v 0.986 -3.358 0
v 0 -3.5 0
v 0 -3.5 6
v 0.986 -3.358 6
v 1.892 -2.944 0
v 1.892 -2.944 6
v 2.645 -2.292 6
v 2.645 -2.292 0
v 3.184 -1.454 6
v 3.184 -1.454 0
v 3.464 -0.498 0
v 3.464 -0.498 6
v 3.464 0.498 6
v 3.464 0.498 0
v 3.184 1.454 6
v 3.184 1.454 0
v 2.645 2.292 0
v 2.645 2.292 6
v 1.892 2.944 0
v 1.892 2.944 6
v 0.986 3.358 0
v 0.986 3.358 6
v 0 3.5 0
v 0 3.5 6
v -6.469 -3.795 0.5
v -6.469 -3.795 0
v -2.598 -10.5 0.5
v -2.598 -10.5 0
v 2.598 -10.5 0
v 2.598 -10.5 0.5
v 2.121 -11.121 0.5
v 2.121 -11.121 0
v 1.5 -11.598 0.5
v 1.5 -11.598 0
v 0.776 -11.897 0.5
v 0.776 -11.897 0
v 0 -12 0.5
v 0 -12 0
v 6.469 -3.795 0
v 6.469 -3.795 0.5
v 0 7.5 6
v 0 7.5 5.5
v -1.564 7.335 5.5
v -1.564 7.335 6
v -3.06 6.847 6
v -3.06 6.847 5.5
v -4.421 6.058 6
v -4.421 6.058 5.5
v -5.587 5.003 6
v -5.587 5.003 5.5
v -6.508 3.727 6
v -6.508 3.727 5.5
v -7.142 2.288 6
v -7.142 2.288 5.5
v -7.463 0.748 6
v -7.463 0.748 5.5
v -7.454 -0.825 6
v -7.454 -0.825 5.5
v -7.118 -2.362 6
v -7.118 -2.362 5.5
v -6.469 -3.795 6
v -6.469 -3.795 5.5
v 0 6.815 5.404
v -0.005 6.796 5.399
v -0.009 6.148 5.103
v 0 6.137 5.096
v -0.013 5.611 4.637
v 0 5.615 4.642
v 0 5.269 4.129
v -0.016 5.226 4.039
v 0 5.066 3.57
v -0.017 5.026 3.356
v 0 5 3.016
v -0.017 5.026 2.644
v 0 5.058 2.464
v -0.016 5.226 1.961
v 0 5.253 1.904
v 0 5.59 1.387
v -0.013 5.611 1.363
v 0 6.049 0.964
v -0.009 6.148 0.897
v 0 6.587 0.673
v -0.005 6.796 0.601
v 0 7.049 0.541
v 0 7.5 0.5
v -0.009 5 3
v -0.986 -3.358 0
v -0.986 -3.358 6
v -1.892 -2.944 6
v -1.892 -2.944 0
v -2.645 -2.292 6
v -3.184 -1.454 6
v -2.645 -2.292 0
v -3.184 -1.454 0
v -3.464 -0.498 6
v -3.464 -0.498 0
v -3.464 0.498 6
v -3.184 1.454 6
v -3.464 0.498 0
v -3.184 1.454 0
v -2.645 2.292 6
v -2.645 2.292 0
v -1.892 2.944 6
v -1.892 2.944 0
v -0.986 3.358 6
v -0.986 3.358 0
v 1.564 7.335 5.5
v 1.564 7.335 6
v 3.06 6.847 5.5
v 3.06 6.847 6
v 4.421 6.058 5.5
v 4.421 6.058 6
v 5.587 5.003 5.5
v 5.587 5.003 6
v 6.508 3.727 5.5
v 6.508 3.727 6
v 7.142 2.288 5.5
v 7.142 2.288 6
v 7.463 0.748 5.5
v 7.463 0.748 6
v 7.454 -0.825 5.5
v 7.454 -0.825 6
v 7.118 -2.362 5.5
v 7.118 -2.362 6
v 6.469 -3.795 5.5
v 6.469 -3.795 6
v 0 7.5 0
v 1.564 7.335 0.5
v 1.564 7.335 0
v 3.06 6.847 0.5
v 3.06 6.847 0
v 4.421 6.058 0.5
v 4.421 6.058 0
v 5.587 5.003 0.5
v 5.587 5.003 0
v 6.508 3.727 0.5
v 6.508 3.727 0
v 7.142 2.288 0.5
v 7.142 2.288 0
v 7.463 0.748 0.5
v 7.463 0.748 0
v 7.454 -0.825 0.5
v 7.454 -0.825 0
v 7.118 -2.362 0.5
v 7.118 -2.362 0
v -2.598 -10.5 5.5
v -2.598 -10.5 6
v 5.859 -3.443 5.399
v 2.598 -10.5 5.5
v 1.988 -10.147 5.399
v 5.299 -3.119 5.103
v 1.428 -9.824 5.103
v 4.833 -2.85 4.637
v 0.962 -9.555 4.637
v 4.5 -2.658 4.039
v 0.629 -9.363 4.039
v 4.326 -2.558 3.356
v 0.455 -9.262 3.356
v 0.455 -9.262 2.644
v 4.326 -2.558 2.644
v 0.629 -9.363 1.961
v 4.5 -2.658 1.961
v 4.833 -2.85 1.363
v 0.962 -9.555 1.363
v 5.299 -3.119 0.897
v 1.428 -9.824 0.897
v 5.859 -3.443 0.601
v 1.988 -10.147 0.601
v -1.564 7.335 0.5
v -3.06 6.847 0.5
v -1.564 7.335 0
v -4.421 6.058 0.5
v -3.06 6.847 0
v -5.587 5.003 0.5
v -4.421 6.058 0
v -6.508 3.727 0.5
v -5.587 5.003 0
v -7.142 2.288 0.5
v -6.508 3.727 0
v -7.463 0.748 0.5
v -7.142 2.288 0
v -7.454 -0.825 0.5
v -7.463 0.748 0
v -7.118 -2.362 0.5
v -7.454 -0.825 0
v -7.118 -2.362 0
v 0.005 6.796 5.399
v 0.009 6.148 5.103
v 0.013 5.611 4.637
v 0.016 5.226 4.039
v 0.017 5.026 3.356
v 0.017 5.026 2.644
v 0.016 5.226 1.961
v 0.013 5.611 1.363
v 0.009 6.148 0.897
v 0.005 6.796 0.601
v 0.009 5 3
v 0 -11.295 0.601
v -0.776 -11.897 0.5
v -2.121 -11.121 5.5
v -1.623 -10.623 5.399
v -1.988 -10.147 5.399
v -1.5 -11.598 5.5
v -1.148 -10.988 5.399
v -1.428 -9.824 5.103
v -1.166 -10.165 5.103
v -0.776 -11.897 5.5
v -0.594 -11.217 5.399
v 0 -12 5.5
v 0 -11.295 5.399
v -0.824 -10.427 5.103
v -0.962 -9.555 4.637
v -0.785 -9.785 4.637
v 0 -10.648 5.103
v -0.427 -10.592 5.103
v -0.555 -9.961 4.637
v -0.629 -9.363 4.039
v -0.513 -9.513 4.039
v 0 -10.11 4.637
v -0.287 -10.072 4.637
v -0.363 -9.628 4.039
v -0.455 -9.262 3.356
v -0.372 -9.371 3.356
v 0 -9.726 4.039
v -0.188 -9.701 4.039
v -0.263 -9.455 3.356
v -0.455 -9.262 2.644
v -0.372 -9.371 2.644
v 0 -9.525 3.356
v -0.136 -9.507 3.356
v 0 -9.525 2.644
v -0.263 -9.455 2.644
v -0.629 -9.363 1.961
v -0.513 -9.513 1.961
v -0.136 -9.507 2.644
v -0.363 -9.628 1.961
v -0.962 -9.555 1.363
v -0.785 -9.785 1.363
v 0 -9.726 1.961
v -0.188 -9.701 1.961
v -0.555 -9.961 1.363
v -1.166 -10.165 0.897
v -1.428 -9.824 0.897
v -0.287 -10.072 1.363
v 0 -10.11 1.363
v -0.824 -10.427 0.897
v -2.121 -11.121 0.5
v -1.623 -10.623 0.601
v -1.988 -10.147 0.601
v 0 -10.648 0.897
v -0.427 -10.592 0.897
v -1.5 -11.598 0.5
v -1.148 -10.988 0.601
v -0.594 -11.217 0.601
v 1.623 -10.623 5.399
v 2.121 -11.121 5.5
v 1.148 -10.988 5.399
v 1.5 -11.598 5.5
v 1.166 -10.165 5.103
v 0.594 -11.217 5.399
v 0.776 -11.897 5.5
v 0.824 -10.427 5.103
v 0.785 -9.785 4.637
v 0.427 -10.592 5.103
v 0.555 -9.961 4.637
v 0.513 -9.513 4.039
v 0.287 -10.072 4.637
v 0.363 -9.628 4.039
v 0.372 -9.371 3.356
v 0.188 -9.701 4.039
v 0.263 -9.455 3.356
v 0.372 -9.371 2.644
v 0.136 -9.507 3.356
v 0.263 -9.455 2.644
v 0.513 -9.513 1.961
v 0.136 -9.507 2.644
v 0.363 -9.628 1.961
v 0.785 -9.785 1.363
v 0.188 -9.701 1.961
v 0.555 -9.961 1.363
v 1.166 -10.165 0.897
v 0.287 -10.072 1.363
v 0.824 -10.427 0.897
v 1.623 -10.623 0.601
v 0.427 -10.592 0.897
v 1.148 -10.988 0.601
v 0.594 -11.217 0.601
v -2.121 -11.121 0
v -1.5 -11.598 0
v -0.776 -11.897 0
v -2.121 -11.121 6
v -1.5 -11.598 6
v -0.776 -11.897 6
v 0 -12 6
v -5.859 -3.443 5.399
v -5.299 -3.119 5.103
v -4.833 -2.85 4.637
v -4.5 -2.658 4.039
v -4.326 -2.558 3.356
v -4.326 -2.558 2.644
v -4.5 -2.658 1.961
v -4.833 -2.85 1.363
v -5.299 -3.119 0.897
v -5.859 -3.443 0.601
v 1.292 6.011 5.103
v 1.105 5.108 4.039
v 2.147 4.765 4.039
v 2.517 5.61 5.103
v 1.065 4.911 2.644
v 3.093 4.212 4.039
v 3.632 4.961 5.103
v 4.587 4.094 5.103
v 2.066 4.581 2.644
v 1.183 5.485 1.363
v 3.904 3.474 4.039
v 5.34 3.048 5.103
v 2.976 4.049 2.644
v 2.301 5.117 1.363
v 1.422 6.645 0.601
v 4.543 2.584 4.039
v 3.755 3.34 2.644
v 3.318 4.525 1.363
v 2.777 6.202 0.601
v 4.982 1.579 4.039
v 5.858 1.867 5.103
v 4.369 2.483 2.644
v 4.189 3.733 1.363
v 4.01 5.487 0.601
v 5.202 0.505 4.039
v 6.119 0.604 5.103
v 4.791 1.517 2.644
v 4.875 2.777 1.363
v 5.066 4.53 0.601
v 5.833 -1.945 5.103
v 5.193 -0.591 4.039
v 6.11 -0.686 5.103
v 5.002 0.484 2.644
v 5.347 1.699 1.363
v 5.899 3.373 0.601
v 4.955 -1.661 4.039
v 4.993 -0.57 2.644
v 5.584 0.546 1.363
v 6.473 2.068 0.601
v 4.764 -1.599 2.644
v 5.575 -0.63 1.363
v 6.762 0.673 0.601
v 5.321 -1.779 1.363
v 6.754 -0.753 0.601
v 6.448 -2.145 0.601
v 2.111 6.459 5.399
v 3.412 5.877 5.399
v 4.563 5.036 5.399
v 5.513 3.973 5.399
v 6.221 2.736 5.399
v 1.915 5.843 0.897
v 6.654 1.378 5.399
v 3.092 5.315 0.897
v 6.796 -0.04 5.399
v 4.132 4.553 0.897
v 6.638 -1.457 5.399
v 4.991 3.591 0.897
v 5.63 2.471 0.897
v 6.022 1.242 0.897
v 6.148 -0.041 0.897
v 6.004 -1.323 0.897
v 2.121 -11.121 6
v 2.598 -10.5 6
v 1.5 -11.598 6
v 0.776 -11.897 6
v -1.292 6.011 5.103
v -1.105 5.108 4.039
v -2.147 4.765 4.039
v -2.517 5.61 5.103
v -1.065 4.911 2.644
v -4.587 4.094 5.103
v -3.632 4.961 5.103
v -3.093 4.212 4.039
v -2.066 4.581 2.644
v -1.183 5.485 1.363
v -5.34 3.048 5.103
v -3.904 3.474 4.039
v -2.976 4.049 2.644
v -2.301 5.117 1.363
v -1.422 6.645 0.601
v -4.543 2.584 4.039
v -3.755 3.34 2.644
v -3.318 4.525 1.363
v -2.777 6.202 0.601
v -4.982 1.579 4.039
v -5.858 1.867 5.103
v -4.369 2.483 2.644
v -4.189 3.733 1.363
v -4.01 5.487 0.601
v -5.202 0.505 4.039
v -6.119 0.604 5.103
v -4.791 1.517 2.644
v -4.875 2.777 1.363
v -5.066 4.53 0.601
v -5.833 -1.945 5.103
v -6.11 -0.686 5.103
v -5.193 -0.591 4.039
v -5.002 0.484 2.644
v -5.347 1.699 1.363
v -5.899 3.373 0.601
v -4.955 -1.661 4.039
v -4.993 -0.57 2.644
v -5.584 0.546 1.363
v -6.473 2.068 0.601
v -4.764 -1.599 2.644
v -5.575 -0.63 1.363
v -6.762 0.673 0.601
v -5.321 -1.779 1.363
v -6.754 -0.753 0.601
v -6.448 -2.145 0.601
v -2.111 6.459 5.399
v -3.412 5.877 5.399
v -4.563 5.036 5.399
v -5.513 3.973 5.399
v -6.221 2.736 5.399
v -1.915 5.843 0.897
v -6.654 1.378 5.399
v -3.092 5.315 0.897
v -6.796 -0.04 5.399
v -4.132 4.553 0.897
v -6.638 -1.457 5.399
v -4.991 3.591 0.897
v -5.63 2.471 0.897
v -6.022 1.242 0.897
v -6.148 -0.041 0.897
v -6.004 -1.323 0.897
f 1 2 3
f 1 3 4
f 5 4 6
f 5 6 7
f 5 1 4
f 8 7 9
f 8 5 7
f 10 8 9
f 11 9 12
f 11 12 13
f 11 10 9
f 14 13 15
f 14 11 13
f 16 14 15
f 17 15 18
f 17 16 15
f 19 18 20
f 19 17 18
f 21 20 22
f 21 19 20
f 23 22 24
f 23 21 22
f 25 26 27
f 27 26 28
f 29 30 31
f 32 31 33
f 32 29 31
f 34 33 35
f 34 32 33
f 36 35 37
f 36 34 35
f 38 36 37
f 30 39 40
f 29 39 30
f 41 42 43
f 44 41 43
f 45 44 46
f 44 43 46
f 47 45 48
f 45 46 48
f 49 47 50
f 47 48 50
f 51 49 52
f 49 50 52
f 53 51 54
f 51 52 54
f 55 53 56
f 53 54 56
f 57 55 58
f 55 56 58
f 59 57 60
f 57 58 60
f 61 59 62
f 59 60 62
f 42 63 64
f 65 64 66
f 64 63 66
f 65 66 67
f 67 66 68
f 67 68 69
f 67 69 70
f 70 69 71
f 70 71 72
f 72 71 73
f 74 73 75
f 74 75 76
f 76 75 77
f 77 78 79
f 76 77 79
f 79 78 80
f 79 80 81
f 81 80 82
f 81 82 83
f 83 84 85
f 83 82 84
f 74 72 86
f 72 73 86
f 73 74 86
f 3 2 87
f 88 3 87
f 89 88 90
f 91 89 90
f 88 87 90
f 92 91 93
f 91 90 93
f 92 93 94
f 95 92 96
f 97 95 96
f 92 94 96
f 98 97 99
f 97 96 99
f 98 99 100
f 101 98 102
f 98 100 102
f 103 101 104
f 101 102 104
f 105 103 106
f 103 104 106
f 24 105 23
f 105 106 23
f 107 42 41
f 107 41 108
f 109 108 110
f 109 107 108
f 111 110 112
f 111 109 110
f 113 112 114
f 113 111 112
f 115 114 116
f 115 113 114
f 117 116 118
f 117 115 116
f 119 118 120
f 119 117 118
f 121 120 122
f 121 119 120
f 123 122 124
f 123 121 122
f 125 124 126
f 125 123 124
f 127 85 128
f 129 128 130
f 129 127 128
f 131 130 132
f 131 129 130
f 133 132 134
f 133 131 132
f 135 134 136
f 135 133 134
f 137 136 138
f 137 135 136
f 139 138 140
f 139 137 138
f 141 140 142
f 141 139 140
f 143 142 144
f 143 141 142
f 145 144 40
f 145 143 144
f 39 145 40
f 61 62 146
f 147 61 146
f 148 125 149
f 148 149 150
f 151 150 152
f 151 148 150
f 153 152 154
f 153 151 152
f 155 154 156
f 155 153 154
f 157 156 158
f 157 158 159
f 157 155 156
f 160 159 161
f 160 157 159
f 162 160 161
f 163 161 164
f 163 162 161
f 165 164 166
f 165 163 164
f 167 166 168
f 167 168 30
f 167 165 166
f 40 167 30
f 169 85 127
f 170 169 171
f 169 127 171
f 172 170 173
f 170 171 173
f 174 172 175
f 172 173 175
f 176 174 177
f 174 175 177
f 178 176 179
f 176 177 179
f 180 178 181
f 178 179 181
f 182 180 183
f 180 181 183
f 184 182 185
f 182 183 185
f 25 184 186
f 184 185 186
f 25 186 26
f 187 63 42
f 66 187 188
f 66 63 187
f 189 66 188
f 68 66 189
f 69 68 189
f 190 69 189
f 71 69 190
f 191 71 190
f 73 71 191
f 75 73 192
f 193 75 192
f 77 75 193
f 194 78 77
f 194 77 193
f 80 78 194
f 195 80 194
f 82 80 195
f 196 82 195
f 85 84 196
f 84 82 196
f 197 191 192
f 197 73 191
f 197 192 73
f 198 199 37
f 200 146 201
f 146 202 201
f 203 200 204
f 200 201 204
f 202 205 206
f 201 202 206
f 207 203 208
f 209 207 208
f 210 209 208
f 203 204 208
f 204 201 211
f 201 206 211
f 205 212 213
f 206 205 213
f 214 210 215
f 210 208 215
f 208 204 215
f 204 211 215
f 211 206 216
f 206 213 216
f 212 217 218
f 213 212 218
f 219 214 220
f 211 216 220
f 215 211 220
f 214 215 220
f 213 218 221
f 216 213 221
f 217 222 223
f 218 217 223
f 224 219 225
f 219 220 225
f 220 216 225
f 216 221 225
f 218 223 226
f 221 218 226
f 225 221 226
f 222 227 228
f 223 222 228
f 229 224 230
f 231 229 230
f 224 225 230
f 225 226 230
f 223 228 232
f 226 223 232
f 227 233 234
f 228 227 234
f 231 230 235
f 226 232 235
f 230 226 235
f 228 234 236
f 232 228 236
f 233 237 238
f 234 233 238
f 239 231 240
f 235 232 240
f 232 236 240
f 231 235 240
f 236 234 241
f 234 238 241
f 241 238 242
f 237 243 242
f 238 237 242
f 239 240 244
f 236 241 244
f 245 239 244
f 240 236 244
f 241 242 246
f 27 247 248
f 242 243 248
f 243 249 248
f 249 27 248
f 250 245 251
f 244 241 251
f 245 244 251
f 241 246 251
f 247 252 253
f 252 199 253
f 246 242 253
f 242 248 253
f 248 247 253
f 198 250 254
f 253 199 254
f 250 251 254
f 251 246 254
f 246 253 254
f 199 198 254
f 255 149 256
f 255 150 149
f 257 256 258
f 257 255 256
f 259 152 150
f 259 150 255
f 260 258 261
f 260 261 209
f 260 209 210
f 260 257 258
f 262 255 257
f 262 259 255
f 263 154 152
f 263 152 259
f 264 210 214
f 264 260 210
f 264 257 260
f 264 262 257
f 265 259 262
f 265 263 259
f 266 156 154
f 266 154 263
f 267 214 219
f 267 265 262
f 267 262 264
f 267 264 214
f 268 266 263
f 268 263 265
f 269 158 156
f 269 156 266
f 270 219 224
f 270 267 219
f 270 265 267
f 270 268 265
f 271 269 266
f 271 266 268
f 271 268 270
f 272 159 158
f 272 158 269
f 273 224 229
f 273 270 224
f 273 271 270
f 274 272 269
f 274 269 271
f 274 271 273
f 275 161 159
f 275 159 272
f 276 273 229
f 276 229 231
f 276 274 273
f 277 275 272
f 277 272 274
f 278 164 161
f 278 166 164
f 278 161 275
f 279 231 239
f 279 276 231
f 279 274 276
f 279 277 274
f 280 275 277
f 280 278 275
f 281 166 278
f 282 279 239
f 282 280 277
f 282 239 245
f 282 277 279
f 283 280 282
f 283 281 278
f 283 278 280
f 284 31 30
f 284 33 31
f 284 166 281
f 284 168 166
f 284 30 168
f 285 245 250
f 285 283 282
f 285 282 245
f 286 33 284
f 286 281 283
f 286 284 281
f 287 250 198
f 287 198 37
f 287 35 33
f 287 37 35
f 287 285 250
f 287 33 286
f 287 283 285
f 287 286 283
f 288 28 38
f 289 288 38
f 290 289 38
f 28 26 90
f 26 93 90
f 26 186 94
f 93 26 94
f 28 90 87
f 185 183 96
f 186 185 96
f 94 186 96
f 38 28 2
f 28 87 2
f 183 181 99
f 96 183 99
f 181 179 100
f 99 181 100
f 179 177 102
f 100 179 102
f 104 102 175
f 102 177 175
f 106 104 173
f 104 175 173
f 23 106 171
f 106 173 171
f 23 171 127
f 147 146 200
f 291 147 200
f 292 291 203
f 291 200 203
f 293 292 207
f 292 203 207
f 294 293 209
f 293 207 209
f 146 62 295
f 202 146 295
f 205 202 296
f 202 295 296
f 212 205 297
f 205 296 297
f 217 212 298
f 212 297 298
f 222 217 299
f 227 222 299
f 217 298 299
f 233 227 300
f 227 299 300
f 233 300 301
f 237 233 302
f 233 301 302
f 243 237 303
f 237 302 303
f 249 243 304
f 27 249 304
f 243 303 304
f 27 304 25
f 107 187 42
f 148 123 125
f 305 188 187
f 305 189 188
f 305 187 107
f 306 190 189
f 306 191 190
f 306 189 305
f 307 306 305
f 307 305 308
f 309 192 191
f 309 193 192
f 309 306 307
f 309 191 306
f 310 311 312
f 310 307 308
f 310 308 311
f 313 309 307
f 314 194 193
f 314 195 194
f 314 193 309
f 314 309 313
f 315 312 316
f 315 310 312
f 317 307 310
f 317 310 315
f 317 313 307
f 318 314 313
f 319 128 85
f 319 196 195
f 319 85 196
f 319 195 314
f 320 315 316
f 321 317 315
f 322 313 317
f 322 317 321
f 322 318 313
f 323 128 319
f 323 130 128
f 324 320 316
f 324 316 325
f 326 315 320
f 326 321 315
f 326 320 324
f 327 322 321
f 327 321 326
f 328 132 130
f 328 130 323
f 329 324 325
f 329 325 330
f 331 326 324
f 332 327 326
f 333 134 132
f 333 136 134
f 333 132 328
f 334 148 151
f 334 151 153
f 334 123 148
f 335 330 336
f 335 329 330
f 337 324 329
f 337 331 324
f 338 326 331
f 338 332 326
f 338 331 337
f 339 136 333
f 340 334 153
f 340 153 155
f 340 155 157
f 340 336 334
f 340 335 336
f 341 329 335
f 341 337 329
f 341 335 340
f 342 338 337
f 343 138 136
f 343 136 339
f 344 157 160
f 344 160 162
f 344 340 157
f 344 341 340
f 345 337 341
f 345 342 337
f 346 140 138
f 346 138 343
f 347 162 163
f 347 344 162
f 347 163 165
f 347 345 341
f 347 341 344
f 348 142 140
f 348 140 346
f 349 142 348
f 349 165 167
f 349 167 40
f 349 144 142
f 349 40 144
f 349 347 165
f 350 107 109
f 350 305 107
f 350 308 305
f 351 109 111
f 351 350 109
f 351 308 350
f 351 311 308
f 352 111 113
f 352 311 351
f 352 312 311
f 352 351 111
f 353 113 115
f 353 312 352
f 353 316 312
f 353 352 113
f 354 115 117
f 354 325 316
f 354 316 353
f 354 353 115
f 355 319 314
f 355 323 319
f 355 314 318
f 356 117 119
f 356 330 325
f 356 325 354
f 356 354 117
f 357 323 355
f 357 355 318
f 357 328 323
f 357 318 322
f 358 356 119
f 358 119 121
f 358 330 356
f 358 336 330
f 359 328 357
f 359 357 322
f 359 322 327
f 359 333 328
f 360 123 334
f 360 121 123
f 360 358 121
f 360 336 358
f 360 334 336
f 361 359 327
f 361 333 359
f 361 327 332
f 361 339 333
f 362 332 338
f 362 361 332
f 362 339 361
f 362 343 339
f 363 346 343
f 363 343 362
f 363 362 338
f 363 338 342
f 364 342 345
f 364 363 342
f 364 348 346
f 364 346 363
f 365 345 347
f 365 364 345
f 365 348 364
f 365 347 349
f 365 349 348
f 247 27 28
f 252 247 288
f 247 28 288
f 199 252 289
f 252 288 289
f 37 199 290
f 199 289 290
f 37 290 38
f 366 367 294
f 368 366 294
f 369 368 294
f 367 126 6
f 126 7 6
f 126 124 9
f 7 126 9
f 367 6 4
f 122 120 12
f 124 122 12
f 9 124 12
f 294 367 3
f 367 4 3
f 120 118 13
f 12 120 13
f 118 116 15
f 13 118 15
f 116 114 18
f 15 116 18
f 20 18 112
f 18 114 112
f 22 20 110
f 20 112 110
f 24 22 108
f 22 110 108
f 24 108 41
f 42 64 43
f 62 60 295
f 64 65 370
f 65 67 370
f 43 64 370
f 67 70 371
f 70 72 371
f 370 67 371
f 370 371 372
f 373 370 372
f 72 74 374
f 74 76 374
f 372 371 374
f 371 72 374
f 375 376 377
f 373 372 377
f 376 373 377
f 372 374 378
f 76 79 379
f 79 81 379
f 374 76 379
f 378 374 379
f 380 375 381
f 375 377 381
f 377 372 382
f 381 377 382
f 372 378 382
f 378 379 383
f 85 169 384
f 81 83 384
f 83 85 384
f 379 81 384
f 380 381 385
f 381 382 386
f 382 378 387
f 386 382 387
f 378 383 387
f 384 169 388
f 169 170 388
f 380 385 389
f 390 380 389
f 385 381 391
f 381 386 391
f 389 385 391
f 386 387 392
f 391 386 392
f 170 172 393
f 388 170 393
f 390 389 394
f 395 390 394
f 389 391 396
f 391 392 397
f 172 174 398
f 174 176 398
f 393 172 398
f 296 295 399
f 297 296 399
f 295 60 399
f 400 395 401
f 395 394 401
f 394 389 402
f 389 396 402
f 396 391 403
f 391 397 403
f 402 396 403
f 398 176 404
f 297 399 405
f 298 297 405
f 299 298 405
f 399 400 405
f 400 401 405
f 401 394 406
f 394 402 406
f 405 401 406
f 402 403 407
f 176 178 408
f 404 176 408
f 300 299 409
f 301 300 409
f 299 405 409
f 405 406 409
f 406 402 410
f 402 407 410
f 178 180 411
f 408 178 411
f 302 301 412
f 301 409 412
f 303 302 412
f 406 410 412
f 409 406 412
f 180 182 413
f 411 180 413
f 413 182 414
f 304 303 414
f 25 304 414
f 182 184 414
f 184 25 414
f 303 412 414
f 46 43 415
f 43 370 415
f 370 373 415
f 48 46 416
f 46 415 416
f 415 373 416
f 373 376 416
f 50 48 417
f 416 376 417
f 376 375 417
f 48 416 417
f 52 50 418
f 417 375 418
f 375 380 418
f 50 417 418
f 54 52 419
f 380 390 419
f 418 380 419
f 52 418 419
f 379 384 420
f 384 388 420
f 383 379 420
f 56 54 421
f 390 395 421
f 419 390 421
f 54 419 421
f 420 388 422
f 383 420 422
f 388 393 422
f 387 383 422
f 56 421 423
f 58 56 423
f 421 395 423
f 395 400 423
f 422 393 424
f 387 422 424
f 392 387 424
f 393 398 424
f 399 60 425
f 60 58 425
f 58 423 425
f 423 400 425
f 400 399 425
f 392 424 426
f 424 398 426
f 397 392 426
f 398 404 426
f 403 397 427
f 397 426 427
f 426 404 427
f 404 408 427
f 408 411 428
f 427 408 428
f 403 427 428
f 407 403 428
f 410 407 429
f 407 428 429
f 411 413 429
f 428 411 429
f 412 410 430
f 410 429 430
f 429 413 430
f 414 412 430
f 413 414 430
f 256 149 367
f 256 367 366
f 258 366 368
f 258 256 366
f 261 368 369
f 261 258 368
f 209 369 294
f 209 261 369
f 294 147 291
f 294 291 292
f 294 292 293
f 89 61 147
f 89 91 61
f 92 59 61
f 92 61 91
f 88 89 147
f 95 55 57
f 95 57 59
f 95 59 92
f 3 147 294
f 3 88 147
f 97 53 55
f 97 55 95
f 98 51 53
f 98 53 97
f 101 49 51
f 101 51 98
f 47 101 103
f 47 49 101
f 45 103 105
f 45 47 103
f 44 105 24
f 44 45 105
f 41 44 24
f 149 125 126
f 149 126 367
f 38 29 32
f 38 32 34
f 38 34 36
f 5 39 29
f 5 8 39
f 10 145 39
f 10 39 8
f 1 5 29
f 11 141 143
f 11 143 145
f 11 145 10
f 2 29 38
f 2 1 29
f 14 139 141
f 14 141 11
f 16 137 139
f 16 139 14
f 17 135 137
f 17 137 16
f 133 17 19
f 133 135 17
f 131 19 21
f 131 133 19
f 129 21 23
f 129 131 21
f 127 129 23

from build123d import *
from build123d import SkipClean  # not in build123d's __all__

# Parameters (mm, degrees)
F1_DEPTH = 6
F9_DEPTH = 25


with BuildPart() as f1:
    # F0 (on Top) → F1 (new body)
    with BuildSketch(Plane.XY):
        with BuildLine():
            Line((0, 3.5), (0, 7.5))
            ThreePointArc((0, 7.5), (-6.5081460588, 3.7274703054), (-6.4690456472, -3.7949240327))
            Line((-6.4690456472, -3.7949240327), (-2.5980762114, -10.4996397702))
            ThreePointArc((-2.5980762114, -10.4996397702), (-1.5, -11.5977159815), (0, -11.9996397702))
            Line((0, -11.9996397702), (0, -3.5))
            ThreePointArc((0, -3.5), (-3.5, 0), (0, 3.5))
        make_face()
    extrude(amount=F1_DEPTH)

    # F4: sweep along a path in F4_path
    with BuildLine(Plane(origin=(-2.5980762114, -10.4996397702, 0), x_dir=(0.5, -0.8660254038, 0), z_dir=(0.8660254038, 0.5, 0))) as f4_path:
        Line((0, 0), (-7.7419388717, 0))
    # F3 (on face) → F4 (sweep, cut)
    with BuildSketch(Plane(origin=(3.8969583329, -6.7497298276, 0), x_dir=(0.8660254038, 0.5, 0), z_dir=(0.5, -0.8660254038, 0))):
        with BuildLine():
            ThreePointArc((-7.4998198851, 0.5), (-4.9998198851, 3), (-7.4998198851, 5.5))
            Line((-7.4998198851, 5.5), (-7.4998198851, 0.5))
        make_face()
    sweep(path=f4_path.line, mode=Mode.SUBTRACT)

    # F7: sweep along a path in F0
    with BuildLine(Plane.XY) as f7_path:
        ThreePointArc((0, 7.5), (-6.5081460588, 3.7274703054), (-6.4690456472, -3.7949240327))
    # F6 (on face) → F7 (sweep, cut)
    with BuildSketch(Plane(origin=(0.0259888971, -0.0450140902, 0), x_dir=(-0.8660254038, -0.5, 0), z_dir=(-0.5, 0.8660254038, 0))):
        with BuildLine():
            ThreePointArc((7.4998198851, 5.5), (4.9998198851, 3), (7.4998198851, 0.5))
            Line((7.4998198851, 0.5), (7.4998198851, 5.5))
        make_face()
    sweep(path=f7_path.line, mode=Mode.SUBTRACT)

    # F8 (on face) → F9 (cut)
    with BuildSketch(Plane.YZ):
        with BuildLine():
            Line((7.5, 0.5), (7.5, 5.5))
            add(Edge.make_bspline(
                [(7.5, 5.5), (5.0000600383, 5.5), (5.0000600383, 3), (5.0000600383, 0.5), (7.5, 0.5)],
                knots=[0, 0, 0, 1.5707963268, 1.5707963268, 3.1415926536, 3.1415926536, 3.1415926536], degree=2, weights=[1, 0.7071067812, 1, 0.7071067812, 1]))
        make_face()
    extrude(amount=-F9_DEPTH, mode=Mode.SUBTRACT)

    # F11: sweep along a path in F0
    with BuildLine(Plane.XY) as f11_path:
        ThreePointArc((-2.5980762114, -10.4996397702), (-1.5, -11.5977159815), (0, -11.9996397702))
    # F10 (on face) → F11 (sweep, cut)
    with BuildSketch(Plane(origin=(3.8969583329, -6.7497298276, 0), x_dir=(-0.8660254038, -0.5, 0), z_dir=(-0.5, 0.8660254038, 0))):
        with BuildLine():
            ThreePointArc((7.4998198851, 5.5), (4.9998198851, 3), (7.4998198851, 0.5))
            Line((7.4998198851, 0.5), (7.4998198851, 5.5))
        make_face()
    sweep(path=f11_path.line, mode=Mode.SUBTRACT)

    # F12: F1 across plane


with BuildPart() as f1_1:
    add(f1.part, clean=False)
    with SkipClean():  # cleaning this boolean's faces spoils the solid; the shape is the same uncleaned
        add(f1.part.mirror(Plane.YZ), clean=False)


solid = f1_1.part
